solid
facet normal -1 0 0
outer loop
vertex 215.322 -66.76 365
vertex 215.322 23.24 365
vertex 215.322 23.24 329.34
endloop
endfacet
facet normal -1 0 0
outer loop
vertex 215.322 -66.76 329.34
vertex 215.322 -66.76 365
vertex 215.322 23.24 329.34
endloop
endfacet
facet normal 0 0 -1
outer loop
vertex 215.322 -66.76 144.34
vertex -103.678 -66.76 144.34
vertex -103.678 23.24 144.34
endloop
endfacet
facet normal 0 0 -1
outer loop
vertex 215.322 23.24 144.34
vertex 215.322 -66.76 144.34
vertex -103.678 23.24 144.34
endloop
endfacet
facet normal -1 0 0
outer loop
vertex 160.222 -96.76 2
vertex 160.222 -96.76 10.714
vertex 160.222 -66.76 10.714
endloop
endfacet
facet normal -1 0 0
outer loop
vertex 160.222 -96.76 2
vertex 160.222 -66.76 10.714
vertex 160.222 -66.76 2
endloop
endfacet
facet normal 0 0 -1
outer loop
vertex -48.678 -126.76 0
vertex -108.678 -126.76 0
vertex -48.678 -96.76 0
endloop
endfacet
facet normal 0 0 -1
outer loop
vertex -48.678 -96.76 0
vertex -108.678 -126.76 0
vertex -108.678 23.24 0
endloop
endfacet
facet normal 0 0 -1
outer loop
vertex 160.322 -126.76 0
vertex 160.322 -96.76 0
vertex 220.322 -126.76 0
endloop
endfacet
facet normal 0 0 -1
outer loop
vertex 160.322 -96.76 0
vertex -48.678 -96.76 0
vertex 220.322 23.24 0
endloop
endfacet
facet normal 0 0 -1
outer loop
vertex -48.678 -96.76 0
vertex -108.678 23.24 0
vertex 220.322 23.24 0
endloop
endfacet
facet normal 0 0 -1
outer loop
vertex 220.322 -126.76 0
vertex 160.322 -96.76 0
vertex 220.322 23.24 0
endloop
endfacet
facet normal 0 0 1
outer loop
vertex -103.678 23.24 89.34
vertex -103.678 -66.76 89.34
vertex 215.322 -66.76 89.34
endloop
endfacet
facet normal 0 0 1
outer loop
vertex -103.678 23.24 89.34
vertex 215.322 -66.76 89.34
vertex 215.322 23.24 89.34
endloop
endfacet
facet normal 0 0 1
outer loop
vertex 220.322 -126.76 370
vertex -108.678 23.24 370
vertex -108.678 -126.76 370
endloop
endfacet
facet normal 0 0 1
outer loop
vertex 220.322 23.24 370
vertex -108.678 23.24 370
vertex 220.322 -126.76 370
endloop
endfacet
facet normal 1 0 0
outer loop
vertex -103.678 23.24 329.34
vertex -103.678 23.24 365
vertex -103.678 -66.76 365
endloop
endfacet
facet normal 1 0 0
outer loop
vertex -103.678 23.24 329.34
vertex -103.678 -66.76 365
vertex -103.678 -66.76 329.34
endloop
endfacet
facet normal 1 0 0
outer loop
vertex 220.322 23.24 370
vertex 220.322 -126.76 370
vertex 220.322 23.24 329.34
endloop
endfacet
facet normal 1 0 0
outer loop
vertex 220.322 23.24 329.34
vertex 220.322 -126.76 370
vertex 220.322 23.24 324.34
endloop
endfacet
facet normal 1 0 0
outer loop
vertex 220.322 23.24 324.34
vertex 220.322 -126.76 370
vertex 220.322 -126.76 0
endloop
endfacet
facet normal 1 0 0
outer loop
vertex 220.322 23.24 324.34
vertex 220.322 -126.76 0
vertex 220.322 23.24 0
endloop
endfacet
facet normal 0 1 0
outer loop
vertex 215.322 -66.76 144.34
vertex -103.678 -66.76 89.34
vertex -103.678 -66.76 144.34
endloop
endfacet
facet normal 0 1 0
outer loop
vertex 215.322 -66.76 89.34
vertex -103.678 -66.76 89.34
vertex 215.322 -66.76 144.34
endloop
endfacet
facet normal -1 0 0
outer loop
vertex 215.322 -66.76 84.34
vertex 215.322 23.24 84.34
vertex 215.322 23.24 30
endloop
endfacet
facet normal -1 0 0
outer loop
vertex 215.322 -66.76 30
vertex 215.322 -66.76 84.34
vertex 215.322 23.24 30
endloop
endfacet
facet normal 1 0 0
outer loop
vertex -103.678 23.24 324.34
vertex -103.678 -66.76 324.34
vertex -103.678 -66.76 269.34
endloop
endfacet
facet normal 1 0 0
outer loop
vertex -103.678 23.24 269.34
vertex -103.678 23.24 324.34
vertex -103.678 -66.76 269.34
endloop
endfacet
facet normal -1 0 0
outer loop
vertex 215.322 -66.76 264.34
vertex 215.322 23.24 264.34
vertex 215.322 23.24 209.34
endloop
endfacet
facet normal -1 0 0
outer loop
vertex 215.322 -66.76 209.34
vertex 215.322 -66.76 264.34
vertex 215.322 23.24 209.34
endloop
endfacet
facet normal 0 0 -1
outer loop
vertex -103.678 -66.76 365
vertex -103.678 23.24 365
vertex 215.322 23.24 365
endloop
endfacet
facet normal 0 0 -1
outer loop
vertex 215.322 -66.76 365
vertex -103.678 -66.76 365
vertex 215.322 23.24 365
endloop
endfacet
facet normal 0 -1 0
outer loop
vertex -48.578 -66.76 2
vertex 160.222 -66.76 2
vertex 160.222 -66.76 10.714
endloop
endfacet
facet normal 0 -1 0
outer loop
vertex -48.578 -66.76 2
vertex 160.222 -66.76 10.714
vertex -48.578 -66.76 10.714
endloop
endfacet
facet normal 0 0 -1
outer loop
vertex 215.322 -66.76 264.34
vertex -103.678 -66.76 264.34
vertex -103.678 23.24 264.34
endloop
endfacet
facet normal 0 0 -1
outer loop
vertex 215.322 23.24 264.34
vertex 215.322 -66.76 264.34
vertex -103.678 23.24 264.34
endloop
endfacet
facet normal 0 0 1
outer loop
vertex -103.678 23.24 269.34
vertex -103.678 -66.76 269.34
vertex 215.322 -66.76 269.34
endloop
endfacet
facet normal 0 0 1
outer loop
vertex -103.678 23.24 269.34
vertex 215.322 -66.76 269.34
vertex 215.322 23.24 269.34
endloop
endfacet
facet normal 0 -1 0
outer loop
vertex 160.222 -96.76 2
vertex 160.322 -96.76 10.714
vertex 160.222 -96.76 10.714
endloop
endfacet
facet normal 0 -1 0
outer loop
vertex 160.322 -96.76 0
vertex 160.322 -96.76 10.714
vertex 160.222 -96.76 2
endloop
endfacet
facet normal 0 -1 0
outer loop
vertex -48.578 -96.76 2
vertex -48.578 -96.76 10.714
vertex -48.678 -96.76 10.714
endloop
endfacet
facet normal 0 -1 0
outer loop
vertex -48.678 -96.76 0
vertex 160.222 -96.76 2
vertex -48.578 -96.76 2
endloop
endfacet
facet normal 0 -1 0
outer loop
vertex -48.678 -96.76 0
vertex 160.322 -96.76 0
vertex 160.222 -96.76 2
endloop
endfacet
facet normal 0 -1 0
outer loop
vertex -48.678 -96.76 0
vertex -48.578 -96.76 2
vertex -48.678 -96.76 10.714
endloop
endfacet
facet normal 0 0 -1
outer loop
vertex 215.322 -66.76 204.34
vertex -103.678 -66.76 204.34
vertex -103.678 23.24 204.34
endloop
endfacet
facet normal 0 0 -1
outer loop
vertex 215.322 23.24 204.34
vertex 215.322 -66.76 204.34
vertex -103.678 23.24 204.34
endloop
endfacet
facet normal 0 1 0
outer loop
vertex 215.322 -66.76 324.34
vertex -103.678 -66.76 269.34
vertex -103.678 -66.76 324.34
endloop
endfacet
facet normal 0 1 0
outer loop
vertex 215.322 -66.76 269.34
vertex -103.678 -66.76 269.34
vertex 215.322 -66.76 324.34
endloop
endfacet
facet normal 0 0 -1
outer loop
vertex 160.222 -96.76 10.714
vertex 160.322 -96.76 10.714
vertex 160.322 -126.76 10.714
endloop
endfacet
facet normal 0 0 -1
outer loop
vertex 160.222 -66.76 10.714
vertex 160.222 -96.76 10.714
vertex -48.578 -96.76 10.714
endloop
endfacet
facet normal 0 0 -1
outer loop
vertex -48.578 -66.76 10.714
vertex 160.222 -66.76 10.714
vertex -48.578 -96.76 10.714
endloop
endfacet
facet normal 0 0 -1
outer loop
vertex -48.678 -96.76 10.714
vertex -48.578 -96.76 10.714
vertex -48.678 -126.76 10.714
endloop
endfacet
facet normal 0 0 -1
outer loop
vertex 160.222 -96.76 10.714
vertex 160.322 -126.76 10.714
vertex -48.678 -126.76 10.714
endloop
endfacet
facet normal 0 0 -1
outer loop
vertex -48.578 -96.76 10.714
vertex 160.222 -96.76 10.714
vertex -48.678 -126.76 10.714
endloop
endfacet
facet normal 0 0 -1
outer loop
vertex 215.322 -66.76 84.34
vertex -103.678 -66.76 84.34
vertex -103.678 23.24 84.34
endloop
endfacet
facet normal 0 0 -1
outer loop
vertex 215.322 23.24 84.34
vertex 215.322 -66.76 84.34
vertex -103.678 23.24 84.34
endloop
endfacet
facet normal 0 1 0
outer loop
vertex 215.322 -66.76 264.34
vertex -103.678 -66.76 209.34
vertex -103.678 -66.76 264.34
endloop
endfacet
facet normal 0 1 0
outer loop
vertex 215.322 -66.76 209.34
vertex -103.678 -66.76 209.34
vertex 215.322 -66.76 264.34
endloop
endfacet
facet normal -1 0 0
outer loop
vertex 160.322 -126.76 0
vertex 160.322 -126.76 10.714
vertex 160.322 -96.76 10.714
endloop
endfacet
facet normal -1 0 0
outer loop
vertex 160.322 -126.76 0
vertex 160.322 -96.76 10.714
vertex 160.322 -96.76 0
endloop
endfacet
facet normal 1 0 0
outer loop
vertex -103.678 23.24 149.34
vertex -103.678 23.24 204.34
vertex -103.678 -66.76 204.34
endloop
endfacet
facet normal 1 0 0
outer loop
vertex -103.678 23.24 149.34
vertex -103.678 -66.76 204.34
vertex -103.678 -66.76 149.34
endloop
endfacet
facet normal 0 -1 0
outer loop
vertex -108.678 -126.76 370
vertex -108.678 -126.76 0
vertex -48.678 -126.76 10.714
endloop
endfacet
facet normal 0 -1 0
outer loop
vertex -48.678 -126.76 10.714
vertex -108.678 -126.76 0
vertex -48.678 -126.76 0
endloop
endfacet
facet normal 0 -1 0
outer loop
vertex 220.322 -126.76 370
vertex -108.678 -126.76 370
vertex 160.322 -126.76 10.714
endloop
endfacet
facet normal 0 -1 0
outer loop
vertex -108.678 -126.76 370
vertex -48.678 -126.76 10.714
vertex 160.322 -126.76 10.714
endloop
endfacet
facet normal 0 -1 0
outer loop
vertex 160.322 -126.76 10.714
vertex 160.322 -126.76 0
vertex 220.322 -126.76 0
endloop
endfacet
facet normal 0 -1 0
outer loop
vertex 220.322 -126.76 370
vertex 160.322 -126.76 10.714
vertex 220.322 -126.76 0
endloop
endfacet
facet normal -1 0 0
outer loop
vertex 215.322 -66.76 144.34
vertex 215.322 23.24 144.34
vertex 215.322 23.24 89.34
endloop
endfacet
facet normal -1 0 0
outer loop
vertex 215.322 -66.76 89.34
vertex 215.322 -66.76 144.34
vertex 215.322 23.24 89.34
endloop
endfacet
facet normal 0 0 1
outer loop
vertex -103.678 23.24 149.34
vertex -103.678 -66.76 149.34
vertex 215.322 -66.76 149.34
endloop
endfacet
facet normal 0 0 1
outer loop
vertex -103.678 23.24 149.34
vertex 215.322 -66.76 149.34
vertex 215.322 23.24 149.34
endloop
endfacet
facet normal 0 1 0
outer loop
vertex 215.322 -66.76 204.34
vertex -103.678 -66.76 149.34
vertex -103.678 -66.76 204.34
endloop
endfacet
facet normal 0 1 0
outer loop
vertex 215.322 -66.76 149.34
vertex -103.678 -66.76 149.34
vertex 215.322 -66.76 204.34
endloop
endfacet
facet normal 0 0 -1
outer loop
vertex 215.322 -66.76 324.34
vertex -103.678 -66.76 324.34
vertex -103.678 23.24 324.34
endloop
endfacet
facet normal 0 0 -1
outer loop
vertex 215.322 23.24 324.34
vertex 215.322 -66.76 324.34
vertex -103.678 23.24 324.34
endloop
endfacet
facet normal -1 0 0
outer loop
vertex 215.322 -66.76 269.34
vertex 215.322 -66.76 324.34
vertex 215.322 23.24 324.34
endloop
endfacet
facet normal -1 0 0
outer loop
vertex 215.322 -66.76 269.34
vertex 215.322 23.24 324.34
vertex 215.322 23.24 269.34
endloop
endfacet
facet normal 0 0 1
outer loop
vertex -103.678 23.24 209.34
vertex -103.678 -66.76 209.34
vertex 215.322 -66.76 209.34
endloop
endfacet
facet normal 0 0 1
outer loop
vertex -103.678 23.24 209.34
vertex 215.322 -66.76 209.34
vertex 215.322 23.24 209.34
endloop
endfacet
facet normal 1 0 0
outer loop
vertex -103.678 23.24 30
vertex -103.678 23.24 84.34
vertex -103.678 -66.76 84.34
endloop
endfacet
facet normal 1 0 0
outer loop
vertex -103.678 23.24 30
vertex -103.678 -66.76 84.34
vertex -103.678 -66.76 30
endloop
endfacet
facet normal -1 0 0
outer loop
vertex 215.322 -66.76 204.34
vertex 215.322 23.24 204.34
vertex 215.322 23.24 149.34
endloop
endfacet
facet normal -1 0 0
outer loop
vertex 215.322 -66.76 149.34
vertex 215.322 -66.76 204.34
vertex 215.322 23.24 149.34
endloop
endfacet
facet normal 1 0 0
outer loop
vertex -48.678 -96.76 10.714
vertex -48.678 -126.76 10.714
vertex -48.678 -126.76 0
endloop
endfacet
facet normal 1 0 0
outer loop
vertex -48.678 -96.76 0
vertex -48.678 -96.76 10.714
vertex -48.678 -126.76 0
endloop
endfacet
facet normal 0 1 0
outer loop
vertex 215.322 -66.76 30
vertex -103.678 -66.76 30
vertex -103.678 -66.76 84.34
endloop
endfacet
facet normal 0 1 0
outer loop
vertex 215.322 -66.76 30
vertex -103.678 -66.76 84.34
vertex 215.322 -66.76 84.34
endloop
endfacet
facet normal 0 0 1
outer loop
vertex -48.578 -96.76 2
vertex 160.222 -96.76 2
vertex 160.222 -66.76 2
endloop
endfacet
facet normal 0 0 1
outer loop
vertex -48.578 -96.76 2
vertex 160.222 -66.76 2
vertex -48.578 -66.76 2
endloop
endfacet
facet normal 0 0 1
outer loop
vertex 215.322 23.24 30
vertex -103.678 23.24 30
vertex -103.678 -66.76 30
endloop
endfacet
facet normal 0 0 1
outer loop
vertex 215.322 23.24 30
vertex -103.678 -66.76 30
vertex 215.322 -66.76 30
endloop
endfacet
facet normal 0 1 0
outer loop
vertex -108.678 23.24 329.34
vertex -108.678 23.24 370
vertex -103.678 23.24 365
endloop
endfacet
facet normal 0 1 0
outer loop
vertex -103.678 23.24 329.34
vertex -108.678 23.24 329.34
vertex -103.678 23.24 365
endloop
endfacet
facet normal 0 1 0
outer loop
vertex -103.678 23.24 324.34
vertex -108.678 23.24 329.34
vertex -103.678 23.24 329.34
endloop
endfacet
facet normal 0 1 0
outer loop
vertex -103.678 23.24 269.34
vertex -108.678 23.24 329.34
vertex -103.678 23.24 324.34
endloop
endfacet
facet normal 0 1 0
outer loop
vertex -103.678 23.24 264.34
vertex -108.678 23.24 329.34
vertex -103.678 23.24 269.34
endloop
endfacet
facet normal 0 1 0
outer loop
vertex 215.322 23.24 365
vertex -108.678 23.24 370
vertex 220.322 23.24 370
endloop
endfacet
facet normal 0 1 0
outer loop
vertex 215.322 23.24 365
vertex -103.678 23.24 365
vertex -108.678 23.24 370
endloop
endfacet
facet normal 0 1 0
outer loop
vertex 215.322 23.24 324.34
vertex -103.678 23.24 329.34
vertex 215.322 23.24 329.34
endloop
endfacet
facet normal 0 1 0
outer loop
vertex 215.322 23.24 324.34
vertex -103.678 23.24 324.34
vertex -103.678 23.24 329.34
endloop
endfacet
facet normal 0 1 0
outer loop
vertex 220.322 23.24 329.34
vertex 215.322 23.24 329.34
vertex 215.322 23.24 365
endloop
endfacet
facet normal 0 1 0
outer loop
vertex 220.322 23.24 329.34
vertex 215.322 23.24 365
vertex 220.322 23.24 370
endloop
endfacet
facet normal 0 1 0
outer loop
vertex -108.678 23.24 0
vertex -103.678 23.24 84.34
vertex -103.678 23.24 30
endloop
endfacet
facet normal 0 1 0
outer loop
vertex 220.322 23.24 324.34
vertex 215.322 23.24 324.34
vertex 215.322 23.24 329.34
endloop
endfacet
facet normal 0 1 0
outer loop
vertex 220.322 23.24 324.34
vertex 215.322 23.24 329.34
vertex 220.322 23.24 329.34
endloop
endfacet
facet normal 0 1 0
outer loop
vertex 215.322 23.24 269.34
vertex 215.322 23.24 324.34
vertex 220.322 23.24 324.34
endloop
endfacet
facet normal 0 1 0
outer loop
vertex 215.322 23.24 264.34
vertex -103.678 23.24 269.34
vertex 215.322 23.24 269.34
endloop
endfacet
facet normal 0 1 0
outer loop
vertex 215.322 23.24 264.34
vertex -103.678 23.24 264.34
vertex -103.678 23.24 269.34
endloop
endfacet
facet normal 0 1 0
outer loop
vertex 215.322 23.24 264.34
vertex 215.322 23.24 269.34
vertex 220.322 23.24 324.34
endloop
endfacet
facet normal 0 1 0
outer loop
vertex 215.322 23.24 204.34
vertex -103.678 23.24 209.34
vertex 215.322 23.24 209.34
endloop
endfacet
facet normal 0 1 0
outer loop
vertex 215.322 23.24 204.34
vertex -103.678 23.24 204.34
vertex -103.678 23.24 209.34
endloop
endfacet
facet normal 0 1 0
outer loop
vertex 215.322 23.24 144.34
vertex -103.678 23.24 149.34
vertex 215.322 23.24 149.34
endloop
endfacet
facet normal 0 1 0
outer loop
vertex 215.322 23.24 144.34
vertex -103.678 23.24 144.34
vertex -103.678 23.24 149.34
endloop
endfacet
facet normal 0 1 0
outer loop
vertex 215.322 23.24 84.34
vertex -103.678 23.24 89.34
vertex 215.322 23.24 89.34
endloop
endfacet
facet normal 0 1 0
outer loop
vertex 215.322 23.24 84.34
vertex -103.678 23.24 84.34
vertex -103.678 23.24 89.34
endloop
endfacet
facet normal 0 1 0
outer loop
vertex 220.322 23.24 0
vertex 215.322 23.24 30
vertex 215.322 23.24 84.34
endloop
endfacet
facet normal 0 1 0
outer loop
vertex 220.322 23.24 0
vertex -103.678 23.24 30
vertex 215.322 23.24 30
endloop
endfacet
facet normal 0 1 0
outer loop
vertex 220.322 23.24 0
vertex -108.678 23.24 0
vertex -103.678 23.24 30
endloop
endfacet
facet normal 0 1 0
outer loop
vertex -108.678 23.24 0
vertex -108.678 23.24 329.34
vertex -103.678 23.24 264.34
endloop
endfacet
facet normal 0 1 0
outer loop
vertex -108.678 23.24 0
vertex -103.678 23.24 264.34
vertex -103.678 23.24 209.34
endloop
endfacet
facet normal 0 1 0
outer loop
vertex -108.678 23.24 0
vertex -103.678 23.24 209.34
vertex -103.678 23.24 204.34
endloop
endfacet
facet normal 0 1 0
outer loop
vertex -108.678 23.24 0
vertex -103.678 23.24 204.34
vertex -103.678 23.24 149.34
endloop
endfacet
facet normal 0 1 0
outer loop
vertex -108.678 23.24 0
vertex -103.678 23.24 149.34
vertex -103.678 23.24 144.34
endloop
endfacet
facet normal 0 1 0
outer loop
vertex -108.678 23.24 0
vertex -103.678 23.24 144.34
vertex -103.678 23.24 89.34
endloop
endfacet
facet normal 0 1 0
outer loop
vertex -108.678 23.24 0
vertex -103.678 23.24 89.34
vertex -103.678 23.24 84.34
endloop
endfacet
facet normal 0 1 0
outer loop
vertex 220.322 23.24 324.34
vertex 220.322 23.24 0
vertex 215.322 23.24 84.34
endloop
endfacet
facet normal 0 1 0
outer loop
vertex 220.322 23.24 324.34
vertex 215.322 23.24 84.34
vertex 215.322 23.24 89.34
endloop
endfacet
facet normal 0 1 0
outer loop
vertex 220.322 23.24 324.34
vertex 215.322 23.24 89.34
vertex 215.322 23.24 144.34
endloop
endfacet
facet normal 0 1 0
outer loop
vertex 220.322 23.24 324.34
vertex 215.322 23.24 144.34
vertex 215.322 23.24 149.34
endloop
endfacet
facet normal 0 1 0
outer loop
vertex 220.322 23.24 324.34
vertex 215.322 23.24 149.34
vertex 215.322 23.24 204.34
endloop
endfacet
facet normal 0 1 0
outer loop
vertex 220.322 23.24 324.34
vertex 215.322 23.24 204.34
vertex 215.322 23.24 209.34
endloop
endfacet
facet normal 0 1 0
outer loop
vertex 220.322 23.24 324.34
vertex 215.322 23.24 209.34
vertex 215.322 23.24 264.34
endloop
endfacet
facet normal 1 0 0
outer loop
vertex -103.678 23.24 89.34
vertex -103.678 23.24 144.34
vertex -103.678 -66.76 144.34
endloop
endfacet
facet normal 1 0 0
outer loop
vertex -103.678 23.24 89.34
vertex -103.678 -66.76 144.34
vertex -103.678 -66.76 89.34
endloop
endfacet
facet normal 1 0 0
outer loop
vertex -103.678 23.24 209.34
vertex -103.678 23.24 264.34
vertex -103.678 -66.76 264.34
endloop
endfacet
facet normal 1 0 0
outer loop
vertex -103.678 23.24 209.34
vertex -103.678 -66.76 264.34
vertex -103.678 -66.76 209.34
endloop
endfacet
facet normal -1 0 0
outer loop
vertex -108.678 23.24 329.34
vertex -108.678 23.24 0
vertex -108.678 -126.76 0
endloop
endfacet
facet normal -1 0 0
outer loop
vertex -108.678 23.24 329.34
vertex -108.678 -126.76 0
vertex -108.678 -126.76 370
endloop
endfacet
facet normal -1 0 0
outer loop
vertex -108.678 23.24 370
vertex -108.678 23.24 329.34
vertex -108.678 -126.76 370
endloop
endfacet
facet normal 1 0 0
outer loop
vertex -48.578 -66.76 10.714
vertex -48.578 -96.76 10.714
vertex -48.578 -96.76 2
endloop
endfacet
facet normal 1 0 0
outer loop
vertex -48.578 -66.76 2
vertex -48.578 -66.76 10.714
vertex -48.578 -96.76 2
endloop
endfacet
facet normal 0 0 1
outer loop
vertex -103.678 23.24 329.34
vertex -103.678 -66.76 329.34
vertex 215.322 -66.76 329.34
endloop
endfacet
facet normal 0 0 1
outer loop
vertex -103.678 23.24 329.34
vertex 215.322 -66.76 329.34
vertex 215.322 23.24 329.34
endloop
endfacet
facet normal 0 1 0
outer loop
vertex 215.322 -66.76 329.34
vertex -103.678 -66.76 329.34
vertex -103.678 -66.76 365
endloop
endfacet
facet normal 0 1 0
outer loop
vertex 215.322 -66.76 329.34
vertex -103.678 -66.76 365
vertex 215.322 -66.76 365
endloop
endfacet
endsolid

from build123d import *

# Parameters (mm, degrees)
ESQUISSE1_W             = 329
ESQUISSE1_H             = 150
BOSS_EXTRU_1_DEPTH      = 370
ESQUISSE2_W             = 319
ESQUISSE2_H             = 335
ENL_V_MAT_EXTRU_1_DEPTH = 90
ESQUISSE3_W             = 209
ESQUISSE3_H             = 10.713791462
ENL_V_MAT_EXTRU_2_DEPTH = 30
ESQUISSE4_W             = 208.8
ESQUISSE4_H             = 8.713791462
ENL_V_MAT_EXTRU_3_DEPTH = 30
ESQUISSE6_W             = 90.150575604
ESQUISSE6_H             = 11.402147775
BOSS_EXTRU_3_DEPTH      = 30
ESQUISSE7_W             = 5
ESQUISSE7_H             = 90
BOSS_EXTRU_4_DEPTH      = 329
ESQUISSE8_W             = 5
ESQUISSE8_H             = 92.498011514
BOSS_EXTRU_5_DEPTH      = 329
ESQUISSE9_W             = 5
ESQUISSE9_H             = 90
BOSS_EXTRU_6_DEPTH      = 329
ESQUISSE10_W            = 5
ESQUISSE10_H            = 90
BOSS_EXTRU_7_DEPTH      = 329
ESQUISSE11_W            = 5
ESQUISSE11_H            = 91.858335329
BOSS_EXTRU_8_DEPTH      = 329


with BuildPart() as part:
    # Esquisse1 → Boss.-Extru.1 (new body)
    with BuildSketch(Plane.XY):
        with Locations((55.821656051, -51.75955414)):
            Rectangle(ESQUISSE1_W, ESQUISSE1_H)
    extrude(amount=BOSS_EXTRU_1_DEPTH)

    # Esquisse2 → Enlèv. mat.-Extru.1 (cut)
    with BuildSketch(Plane(origin=(0, 23.24044586, 0), x_dir=(1, 0, 0), z_dir=(0, 1, 0))):
        with Locations((55.821656051, -197.5)):
            Rectangle(ESQUISSE2_W, ESQUISSE2_H)
    extrude(amount=-ENL_V_MAT_EXTRU_1_DEPTH, mode=Mode.SUBTRACT)

    # Esquisse3 → Enlèv. mat.-Extru.2 (cut)
    with BuildSketch(Plane(origin=(0, -126.75955414, 0), x_dir=(-1, 0, 0), z_dir=(0, -1, 0))):
        with Locations((-55.821656051, -5.356895731)):
            Rectangle(ESQUISSE3_W, ESQUISSE3_H)
    extrude(amount=-ENL_V_MAT_EXTRU_2_DEPTH, mode=Mode.SUBTRACT)

    # Esquisse4 → Enlèv. mat.-Extru.3 (cut)
    with BuildSketch(Plane(origin=(0, -96.75955414, 0), x_dir=(-1, 0, 0), z_dir=(0, -1, 0))):
        with Locations((-55.821656051, -6.356895731)):
            Rectangle(ESQUISSE4_W, ESQUISSE4_H)
    extrude(amount=-ENL_V_MAT_EXTRU_3_DEPTH, mode=Mode.SUBTRACT)

    # Esquisse6 → Boss.-Extru.3 (add)
    with BuildSketch(Plane(origin=(0, -66.75955414, 0), x_dir=(-1, 0, 0), z_dir=(0, -1, 0))):
        with Locations((3.603056147, -11.057969619)):
            Rectangle(ESQUISSE6_W, ESQUISSE6_H)
    extrude(amount=-BOSS_EXTRU_3_DEPTH)

    # Esquisse7 → Boss.-Extru.4 (add)
    with BuildSketch(Plane.ZY.offset(108.678343949)):
        with Locations((86.839910946, -21.75955414)):
            Rectangle(ESQUISSE7_W, ESQUISSE7_H)
    extrude(amount=-BOSS_EXTRU_4_DEPTH)

    # Esquisse8 → Boss.-Extru.5 (add)
    with BuildSketch(Plane.ZY.offset(108.678343949)):
        with Locations((146.839910946, -23.008559897)):
            Rectangle(ESQUISSE8_W, ESQUISSE8_H)
    extrude(amount=-BOSS_EXTRU_5_DEPTH)

    # Esquisse9 → Boss.-Extru.6 (add)
    with BuildSketch(Plane.ZY.offset(108.678343949)):
        with Locations((206.839910946, -21.75955414)):
            Rectangle(ESQUISSE9_W, ESQUISSE9_H)
    extrude(amount=-BOSS_EXTRU_6_DEPTH)

    # Esquisse10 → Boss.-Extru.7 (add)
    with BuildSketch(Plane.ZY.offset(108.678343949)):
        with Locations((266.839910946, -21.75955414)):
            Rectangle(ESQUISSE10_W, ESQUISSE10_H)
    extrude(amount=-BOSS_EXTRU_7_DEPTH)

    # Esquisse11 → Boss.-Extru.8 (add)
    with BuildSketch(Plane.ZY.offset(108.678343949)):
        with Locations((326.839910946, -22.688721805)):
            Rectangle(ESQUISSE11_W, ESQUISSE11_H)
    extrude(amount=-BOSS_EXTRU_8_DEPTH)


solid = part.part
